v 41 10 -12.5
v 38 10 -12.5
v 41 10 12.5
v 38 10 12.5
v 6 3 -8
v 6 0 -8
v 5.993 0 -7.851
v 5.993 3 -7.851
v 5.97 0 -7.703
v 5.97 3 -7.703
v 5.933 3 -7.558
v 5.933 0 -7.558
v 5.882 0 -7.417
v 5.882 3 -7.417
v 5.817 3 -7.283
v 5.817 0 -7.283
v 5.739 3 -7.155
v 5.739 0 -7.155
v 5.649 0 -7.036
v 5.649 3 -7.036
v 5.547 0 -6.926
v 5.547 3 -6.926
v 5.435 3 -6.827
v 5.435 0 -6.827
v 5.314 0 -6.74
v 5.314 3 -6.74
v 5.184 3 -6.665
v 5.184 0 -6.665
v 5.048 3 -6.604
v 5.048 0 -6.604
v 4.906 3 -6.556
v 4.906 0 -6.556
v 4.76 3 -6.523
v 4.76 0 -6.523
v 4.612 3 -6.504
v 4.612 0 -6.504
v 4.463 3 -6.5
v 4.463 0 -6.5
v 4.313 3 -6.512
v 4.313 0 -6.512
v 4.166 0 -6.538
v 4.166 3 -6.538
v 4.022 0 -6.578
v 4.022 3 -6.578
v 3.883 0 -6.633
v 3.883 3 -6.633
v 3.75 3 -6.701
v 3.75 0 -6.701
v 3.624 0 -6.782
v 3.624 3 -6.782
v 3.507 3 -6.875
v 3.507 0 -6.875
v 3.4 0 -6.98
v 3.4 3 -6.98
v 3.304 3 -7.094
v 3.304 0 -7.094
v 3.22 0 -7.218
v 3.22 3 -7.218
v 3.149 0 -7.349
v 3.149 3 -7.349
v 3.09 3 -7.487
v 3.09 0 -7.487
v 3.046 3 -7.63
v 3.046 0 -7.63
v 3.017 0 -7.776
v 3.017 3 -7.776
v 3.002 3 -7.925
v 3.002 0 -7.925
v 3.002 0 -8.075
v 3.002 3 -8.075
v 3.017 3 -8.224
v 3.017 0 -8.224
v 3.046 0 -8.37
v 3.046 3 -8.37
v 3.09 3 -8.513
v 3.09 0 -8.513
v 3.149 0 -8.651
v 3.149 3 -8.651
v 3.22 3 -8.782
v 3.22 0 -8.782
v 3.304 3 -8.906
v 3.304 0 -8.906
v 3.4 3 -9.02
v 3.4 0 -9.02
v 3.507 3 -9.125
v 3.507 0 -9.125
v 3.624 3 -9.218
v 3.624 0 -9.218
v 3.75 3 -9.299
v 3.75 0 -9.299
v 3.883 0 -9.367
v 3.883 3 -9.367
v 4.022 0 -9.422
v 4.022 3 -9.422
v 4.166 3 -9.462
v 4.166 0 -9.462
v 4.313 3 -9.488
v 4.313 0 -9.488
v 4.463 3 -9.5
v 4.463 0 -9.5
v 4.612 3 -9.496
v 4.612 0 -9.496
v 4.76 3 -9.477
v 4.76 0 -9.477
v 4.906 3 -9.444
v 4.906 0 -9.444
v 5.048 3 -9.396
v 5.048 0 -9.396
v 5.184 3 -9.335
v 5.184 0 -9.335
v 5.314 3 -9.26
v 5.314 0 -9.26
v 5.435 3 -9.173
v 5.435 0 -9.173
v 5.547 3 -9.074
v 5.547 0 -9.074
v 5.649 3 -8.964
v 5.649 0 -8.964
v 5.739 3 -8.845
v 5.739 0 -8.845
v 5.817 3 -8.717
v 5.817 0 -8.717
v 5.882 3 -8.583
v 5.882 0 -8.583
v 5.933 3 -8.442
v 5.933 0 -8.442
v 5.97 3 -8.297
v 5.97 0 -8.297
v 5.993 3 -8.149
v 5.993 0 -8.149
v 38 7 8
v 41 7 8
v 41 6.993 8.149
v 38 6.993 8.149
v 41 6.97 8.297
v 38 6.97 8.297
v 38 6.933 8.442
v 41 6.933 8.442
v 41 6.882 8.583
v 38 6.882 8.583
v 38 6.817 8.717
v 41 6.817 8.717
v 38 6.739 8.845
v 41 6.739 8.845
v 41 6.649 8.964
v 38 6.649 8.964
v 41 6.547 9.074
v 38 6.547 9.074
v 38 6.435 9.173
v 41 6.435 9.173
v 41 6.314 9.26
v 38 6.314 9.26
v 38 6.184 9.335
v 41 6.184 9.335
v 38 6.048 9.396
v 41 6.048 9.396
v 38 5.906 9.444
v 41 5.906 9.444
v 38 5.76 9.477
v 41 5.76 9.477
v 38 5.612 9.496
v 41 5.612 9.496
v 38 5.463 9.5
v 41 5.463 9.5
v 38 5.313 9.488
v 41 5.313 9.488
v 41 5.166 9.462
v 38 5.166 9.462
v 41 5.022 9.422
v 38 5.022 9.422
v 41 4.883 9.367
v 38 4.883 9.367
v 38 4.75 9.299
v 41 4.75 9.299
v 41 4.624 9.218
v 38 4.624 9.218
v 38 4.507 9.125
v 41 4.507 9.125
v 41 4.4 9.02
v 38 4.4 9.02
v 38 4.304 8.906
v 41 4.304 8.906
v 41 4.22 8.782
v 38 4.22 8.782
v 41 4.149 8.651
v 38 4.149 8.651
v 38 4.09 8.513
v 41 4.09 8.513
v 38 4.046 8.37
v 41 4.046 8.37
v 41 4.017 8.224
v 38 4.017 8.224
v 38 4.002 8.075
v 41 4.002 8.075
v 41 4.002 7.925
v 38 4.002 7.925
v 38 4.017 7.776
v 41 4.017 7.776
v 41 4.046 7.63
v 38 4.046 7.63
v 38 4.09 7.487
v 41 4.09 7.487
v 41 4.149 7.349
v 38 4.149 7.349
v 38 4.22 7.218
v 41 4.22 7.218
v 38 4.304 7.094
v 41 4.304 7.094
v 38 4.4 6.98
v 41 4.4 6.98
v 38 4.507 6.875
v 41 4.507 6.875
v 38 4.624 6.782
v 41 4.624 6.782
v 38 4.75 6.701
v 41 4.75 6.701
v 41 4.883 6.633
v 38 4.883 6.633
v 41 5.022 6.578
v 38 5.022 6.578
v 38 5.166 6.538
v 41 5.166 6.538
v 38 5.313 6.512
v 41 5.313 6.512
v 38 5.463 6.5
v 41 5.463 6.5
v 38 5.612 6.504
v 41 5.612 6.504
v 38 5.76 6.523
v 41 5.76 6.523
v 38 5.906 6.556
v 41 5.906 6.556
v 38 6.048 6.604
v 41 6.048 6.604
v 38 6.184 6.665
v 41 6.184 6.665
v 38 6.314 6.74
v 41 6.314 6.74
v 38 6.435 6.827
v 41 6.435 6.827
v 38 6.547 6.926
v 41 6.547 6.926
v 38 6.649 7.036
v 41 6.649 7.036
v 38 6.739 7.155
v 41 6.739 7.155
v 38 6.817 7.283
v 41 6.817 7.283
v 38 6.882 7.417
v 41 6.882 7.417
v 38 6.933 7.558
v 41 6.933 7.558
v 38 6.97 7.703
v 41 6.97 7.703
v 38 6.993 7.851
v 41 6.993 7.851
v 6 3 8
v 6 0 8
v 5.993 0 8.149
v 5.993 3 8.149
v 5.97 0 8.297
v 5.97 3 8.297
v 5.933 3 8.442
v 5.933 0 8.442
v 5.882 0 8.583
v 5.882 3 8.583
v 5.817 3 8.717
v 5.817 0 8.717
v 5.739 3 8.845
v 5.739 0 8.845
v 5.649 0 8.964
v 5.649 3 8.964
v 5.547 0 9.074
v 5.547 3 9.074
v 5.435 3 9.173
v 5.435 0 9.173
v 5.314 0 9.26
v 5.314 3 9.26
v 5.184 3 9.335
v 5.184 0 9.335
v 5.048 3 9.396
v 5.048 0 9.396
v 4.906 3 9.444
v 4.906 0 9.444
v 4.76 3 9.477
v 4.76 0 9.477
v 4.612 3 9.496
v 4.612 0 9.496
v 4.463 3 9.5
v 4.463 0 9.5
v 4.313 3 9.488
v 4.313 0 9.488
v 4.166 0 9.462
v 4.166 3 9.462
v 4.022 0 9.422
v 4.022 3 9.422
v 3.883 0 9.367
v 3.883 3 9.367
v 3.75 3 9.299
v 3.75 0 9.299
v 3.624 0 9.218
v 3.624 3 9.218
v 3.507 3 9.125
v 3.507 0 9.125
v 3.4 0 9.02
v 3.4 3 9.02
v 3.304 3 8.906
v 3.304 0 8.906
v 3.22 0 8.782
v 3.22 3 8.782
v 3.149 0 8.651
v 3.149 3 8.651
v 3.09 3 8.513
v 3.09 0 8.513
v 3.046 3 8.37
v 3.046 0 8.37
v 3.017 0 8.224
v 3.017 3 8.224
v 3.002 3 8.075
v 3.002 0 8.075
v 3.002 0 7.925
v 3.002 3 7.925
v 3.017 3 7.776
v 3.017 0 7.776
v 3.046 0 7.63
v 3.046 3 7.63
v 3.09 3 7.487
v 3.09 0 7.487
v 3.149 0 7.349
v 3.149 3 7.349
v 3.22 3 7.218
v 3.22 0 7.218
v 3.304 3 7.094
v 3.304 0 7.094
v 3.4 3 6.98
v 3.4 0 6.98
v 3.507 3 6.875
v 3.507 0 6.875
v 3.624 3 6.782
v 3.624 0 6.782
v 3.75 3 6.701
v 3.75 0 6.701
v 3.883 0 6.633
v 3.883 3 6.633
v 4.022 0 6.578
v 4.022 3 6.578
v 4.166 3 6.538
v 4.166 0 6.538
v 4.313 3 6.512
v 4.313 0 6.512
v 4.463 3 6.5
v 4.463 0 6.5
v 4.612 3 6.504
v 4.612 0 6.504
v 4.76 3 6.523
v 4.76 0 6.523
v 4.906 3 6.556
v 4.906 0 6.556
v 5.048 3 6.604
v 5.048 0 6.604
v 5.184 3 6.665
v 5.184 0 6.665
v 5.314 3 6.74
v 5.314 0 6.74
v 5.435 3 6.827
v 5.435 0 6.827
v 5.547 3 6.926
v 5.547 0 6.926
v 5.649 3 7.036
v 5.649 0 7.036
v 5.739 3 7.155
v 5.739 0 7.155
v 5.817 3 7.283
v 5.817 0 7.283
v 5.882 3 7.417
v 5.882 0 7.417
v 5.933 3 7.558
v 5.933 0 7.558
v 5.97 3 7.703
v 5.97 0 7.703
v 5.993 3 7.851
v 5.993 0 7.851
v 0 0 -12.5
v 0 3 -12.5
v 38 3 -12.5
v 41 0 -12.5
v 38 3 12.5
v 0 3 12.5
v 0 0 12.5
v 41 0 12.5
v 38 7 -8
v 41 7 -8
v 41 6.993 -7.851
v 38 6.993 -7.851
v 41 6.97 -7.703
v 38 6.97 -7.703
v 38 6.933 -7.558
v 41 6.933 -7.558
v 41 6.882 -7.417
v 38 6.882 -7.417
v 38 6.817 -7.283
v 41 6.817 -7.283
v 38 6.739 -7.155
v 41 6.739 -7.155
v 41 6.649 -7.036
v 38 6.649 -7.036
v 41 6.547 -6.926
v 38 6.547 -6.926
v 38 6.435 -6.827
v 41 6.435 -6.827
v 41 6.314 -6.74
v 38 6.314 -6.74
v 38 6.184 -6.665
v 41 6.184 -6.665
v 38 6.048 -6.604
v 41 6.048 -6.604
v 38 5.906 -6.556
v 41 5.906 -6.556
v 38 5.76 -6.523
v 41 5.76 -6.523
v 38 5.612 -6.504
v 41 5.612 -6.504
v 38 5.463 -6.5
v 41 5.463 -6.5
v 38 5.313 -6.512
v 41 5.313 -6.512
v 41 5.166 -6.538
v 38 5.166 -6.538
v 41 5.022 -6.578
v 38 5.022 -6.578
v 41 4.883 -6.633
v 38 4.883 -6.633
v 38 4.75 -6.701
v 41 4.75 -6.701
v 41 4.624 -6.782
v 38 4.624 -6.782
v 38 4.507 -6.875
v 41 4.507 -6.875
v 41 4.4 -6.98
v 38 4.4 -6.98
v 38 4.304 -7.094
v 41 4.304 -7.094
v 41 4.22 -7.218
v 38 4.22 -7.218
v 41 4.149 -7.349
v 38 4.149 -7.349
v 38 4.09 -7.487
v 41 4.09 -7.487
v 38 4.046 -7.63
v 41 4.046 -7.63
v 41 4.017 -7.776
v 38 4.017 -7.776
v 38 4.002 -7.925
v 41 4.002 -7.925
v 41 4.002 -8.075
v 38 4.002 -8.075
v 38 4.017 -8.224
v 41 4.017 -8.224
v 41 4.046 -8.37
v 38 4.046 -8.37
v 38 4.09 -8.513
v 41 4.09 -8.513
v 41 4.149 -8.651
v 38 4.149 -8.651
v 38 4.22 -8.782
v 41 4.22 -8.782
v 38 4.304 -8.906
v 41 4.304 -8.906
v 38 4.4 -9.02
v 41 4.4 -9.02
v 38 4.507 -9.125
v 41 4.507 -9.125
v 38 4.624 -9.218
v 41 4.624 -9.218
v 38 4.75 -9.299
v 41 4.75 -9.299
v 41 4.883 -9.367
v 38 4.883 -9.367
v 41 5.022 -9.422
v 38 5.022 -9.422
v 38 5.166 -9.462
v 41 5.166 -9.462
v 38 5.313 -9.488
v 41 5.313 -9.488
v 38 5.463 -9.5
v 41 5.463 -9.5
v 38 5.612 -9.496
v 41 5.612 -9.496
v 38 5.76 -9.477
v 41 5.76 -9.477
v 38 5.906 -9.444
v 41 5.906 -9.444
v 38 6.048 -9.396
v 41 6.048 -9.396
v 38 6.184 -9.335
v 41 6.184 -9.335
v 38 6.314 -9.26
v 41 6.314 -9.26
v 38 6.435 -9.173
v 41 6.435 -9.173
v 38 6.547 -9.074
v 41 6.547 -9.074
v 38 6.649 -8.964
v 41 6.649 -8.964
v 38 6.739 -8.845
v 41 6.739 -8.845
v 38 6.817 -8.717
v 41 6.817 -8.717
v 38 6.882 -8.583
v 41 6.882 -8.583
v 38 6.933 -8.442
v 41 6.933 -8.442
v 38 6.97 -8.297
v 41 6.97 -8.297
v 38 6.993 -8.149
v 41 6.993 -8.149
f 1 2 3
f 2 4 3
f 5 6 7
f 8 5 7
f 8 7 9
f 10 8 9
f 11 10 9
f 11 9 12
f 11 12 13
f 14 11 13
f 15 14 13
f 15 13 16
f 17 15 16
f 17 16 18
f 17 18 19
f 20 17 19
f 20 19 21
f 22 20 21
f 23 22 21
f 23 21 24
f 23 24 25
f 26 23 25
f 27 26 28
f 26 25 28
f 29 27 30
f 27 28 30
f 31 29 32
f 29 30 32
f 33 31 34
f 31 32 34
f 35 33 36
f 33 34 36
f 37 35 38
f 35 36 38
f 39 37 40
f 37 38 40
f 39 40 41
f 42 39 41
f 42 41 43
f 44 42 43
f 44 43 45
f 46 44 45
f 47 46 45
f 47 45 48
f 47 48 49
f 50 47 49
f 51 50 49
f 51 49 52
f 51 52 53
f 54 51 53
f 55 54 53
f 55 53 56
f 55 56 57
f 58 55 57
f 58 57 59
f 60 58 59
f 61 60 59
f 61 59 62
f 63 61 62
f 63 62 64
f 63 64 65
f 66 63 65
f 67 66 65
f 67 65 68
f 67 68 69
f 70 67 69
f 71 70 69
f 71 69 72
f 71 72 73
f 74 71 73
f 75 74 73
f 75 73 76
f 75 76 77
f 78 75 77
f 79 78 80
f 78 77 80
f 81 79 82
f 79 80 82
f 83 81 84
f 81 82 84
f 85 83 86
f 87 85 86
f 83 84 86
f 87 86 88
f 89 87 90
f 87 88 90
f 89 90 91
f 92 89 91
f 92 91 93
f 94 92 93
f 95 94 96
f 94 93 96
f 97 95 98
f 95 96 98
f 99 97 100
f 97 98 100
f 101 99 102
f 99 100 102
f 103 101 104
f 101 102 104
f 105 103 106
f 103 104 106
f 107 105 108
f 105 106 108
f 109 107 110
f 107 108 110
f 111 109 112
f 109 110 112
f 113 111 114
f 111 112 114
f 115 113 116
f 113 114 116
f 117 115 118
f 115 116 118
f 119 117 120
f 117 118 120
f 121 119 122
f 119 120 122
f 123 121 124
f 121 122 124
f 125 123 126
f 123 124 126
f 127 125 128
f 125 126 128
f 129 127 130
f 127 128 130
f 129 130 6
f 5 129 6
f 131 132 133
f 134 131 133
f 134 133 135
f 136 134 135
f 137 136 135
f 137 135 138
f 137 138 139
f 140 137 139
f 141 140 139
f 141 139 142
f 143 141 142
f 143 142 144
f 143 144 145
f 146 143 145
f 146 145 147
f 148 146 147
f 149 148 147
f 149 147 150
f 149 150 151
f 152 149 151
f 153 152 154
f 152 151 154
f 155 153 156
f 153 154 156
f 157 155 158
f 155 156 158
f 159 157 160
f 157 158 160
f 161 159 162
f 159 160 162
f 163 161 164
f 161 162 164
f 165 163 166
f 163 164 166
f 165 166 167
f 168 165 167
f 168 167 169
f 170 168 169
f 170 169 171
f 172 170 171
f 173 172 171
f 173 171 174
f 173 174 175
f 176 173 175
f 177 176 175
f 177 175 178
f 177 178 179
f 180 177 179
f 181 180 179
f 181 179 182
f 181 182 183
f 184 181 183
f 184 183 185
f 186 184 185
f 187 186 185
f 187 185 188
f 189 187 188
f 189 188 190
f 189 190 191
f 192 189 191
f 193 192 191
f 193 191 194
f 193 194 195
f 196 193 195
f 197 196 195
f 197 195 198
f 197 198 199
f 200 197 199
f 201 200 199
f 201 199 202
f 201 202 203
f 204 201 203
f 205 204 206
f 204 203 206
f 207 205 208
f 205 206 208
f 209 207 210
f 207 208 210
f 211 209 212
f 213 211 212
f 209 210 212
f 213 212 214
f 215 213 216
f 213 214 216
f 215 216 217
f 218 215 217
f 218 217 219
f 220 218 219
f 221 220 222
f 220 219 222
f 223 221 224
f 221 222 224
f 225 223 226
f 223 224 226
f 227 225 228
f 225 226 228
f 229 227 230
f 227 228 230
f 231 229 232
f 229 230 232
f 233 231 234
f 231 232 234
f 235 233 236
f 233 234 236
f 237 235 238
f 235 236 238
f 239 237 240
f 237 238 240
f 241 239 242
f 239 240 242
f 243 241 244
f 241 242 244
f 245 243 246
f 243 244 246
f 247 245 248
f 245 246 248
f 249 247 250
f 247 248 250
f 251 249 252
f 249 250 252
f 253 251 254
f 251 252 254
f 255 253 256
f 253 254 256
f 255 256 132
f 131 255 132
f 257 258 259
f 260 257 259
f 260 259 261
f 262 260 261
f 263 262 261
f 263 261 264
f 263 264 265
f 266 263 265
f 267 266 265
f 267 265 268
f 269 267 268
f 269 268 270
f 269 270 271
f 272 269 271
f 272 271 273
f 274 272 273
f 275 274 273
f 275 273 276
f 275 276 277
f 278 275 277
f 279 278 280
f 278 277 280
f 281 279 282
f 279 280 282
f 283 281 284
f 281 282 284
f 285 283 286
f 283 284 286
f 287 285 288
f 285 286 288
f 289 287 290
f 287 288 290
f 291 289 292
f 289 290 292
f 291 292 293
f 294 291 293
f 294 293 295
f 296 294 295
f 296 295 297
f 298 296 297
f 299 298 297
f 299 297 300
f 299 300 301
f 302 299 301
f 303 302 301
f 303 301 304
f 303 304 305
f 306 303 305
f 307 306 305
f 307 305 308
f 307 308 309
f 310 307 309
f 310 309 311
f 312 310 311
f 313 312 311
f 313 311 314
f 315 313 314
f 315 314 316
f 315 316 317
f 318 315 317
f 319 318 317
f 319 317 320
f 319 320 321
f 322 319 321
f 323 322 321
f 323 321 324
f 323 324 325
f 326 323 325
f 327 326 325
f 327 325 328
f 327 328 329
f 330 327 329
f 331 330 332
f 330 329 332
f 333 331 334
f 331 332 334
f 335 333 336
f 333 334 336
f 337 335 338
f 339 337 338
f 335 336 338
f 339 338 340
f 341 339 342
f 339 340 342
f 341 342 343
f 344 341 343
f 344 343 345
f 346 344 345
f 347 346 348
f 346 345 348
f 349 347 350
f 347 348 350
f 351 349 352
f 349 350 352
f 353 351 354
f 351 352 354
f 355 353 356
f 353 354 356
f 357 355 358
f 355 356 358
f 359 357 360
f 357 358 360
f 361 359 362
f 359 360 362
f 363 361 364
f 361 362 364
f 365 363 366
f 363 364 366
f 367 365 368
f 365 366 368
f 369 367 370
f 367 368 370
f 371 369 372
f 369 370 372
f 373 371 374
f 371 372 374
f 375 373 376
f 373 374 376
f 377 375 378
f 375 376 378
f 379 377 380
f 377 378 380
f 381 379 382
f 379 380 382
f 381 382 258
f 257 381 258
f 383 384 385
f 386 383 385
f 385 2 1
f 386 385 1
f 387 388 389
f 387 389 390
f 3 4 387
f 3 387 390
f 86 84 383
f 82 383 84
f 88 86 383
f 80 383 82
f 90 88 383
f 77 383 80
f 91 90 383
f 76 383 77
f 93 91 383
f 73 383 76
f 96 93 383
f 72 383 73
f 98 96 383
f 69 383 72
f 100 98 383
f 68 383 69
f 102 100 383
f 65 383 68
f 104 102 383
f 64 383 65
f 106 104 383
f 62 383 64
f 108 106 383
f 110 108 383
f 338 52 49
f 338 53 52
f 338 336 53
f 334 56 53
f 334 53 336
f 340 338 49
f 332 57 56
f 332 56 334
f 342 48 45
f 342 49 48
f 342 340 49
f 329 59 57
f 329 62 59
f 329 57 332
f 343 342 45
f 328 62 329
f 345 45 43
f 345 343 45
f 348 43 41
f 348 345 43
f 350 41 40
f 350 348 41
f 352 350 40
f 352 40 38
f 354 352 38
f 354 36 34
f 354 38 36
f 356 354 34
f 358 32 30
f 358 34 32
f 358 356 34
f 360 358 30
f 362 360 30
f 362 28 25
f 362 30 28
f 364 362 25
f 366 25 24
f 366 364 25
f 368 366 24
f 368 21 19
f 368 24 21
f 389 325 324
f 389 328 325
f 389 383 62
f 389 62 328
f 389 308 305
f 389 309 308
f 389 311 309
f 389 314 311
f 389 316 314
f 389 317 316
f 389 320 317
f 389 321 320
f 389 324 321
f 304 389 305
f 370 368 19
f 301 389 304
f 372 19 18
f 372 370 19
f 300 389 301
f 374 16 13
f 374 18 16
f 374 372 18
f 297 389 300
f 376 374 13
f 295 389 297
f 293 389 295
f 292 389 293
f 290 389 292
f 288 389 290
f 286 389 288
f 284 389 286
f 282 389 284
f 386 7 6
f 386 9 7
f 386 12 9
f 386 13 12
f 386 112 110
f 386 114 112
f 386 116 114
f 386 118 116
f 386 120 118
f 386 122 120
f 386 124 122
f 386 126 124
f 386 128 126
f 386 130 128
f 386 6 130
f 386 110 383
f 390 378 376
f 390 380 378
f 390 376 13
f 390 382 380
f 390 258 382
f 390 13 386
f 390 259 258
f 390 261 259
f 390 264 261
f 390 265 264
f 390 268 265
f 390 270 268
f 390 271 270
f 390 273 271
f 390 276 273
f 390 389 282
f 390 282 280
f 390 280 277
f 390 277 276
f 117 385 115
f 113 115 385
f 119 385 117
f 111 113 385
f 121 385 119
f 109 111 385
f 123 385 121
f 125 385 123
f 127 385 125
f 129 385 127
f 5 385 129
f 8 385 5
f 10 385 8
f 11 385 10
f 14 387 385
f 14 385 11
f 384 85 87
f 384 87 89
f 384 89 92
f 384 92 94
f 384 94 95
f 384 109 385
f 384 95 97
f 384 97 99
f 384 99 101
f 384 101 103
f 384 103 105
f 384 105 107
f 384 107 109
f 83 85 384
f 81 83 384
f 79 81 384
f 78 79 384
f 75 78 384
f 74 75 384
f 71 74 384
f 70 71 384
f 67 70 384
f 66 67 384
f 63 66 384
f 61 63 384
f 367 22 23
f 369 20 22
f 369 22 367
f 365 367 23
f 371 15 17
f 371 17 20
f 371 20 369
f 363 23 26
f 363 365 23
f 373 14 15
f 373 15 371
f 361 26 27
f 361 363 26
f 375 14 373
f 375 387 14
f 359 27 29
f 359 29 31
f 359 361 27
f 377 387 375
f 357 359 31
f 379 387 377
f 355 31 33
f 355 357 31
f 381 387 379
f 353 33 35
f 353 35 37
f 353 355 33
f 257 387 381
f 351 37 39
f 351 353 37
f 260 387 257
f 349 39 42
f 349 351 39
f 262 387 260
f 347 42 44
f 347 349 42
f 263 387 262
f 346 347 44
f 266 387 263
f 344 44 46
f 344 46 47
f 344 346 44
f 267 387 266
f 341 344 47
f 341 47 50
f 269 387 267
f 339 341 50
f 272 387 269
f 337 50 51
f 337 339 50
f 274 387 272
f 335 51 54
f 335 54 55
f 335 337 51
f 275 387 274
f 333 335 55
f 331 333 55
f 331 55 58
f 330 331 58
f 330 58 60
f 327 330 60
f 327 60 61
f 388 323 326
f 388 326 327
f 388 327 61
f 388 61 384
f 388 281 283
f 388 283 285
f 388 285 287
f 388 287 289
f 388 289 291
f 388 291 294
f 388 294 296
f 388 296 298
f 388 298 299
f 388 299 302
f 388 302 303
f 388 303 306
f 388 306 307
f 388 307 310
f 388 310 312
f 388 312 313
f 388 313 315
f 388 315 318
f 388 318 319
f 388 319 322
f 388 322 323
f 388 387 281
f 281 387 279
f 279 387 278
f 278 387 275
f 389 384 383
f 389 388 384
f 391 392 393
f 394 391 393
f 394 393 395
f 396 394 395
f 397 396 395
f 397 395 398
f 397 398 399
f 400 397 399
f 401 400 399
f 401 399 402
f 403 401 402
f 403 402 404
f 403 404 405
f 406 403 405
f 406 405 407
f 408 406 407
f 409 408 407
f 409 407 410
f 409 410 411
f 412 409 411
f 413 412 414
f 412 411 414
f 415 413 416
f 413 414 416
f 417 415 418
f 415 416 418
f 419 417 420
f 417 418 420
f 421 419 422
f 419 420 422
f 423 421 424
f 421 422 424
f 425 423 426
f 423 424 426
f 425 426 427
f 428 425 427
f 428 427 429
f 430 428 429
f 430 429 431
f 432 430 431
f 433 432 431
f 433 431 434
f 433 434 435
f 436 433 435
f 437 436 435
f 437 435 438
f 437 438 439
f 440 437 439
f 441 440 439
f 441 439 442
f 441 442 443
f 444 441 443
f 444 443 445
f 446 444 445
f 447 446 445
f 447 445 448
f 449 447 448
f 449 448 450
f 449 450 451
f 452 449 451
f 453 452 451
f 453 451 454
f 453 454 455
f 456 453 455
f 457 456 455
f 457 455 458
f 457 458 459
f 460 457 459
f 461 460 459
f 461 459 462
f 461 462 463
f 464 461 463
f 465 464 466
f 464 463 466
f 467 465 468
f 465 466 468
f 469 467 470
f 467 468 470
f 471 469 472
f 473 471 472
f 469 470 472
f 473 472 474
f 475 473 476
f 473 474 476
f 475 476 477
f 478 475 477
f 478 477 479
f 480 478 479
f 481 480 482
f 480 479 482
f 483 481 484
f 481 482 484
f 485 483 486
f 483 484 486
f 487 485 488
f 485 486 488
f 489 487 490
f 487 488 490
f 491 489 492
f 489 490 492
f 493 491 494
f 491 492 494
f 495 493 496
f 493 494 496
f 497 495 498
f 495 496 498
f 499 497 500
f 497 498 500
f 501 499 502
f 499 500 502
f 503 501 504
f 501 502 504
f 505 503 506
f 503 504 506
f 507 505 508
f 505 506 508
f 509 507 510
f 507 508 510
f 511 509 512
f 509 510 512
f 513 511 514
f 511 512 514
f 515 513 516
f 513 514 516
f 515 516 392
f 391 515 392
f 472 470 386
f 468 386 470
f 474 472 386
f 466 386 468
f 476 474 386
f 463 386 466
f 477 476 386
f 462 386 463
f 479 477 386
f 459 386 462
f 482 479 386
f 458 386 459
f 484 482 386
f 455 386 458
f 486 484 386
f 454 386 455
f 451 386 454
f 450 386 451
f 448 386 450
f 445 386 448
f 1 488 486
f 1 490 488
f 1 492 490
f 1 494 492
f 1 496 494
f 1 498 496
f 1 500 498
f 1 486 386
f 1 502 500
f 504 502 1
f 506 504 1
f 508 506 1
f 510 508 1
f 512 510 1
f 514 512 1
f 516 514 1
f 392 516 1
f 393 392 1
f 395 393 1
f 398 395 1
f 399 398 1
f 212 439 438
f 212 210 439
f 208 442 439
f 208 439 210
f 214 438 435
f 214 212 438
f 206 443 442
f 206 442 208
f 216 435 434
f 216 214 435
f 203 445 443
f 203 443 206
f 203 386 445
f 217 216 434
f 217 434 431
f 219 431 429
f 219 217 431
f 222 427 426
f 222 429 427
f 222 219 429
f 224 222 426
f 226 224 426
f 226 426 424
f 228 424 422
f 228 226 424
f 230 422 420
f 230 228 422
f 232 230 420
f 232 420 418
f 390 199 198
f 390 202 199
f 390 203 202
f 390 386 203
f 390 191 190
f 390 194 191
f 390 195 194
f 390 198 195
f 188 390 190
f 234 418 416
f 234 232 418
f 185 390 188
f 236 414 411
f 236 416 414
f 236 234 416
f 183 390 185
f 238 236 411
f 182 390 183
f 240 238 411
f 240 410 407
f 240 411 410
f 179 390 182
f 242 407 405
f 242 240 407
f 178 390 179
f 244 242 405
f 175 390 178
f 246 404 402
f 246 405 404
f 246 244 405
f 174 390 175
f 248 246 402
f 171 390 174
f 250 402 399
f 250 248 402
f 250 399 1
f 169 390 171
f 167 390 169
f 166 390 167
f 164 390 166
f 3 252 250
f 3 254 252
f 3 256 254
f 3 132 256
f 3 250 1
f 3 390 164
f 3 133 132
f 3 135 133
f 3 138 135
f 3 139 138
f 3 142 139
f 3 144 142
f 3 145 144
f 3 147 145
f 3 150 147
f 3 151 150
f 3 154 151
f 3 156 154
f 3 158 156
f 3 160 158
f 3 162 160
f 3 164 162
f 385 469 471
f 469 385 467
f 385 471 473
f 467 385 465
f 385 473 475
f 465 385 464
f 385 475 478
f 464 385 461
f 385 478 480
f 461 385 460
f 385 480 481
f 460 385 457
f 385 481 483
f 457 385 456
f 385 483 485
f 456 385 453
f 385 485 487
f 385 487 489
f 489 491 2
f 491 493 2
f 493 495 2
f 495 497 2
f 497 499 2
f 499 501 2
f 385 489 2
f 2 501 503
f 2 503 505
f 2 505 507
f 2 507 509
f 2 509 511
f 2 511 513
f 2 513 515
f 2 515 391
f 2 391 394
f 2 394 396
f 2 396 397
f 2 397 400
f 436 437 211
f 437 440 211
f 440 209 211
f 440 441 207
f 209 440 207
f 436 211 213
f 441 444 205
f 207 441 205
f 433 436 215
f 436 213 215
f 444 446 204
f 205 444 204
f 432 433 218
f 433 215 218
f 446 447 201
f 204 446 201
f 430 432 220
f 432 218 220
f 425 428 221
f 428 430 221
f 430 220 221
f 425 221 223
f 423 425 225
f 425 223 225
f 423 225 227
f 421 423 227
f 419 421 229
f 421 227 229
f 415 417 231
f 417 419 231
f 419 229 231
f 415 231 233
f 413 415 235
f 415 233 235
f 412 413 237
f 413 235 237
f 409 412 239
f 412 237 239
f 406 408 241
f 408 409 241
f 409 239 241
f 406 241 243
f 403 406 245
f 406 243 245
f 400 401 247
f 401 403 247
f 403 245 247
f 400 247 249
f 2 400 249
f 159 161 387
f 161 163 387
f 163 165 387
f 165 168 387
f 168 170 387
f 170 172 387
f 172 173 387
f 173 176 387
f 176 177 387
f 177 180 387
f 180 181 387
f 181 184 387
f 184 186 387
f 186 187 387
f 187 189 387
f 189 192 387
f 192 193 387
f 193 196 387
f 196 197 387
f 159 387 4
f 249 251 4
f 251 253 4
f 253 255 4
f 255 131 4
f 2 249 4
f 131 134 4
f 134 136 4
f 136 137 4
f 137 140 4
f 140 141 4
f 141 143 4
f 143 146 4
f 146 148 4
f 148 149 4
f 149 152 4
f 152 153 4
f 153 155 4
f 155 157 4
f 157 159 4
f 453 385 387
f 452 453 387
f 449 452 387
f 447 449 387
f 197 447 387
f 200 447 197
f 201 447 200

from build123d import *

# Parameters (mm, degrees)
F0_W     = 3
F0_H     = 7
F1_DEPTH = 12.5
F2_R     = 1.5
F3_DEPTH = 25.4
F4_R     = 1.5
F5_DEPTH = 25.4


with BuildPart() as f1:
    # F0 (on Top) → F1 (new body, symmetric)
    with BuildSketch(Plane.XY):
        Polygon((0, 3), (0, 0), (41, 0), (41, 3), (38, 3), align=None)
        with Locations((39.5, 6.5)):
            Rectangle(F0_W, F0_H)
    extrude(amount=F1_DEPTH, both=True)

    # F2 (on face) → F3 (cut)
    with BuildSketch(Plane.XZ):
        with Locations((4.5, 8)):
            Circle(F2_R)
        with Locations((4.5, -8)):
            Circle(F2_R)
    extrude(amount=-F3_DEPTH, mode=Mode.SUBTRACT)

    # F4 (on face) → F5 (cut)
    with BuildSketch(Plane.YZ.offset(41)):
        with Locations((5.5, 8)):
            Circle(F4_R)
        with Locations((5.5, -8)):
            Circle(F4_R)
    extrude(amount=-F5_DEPTH, mode=Mode.SUBTRACT)


solid = f1.part
